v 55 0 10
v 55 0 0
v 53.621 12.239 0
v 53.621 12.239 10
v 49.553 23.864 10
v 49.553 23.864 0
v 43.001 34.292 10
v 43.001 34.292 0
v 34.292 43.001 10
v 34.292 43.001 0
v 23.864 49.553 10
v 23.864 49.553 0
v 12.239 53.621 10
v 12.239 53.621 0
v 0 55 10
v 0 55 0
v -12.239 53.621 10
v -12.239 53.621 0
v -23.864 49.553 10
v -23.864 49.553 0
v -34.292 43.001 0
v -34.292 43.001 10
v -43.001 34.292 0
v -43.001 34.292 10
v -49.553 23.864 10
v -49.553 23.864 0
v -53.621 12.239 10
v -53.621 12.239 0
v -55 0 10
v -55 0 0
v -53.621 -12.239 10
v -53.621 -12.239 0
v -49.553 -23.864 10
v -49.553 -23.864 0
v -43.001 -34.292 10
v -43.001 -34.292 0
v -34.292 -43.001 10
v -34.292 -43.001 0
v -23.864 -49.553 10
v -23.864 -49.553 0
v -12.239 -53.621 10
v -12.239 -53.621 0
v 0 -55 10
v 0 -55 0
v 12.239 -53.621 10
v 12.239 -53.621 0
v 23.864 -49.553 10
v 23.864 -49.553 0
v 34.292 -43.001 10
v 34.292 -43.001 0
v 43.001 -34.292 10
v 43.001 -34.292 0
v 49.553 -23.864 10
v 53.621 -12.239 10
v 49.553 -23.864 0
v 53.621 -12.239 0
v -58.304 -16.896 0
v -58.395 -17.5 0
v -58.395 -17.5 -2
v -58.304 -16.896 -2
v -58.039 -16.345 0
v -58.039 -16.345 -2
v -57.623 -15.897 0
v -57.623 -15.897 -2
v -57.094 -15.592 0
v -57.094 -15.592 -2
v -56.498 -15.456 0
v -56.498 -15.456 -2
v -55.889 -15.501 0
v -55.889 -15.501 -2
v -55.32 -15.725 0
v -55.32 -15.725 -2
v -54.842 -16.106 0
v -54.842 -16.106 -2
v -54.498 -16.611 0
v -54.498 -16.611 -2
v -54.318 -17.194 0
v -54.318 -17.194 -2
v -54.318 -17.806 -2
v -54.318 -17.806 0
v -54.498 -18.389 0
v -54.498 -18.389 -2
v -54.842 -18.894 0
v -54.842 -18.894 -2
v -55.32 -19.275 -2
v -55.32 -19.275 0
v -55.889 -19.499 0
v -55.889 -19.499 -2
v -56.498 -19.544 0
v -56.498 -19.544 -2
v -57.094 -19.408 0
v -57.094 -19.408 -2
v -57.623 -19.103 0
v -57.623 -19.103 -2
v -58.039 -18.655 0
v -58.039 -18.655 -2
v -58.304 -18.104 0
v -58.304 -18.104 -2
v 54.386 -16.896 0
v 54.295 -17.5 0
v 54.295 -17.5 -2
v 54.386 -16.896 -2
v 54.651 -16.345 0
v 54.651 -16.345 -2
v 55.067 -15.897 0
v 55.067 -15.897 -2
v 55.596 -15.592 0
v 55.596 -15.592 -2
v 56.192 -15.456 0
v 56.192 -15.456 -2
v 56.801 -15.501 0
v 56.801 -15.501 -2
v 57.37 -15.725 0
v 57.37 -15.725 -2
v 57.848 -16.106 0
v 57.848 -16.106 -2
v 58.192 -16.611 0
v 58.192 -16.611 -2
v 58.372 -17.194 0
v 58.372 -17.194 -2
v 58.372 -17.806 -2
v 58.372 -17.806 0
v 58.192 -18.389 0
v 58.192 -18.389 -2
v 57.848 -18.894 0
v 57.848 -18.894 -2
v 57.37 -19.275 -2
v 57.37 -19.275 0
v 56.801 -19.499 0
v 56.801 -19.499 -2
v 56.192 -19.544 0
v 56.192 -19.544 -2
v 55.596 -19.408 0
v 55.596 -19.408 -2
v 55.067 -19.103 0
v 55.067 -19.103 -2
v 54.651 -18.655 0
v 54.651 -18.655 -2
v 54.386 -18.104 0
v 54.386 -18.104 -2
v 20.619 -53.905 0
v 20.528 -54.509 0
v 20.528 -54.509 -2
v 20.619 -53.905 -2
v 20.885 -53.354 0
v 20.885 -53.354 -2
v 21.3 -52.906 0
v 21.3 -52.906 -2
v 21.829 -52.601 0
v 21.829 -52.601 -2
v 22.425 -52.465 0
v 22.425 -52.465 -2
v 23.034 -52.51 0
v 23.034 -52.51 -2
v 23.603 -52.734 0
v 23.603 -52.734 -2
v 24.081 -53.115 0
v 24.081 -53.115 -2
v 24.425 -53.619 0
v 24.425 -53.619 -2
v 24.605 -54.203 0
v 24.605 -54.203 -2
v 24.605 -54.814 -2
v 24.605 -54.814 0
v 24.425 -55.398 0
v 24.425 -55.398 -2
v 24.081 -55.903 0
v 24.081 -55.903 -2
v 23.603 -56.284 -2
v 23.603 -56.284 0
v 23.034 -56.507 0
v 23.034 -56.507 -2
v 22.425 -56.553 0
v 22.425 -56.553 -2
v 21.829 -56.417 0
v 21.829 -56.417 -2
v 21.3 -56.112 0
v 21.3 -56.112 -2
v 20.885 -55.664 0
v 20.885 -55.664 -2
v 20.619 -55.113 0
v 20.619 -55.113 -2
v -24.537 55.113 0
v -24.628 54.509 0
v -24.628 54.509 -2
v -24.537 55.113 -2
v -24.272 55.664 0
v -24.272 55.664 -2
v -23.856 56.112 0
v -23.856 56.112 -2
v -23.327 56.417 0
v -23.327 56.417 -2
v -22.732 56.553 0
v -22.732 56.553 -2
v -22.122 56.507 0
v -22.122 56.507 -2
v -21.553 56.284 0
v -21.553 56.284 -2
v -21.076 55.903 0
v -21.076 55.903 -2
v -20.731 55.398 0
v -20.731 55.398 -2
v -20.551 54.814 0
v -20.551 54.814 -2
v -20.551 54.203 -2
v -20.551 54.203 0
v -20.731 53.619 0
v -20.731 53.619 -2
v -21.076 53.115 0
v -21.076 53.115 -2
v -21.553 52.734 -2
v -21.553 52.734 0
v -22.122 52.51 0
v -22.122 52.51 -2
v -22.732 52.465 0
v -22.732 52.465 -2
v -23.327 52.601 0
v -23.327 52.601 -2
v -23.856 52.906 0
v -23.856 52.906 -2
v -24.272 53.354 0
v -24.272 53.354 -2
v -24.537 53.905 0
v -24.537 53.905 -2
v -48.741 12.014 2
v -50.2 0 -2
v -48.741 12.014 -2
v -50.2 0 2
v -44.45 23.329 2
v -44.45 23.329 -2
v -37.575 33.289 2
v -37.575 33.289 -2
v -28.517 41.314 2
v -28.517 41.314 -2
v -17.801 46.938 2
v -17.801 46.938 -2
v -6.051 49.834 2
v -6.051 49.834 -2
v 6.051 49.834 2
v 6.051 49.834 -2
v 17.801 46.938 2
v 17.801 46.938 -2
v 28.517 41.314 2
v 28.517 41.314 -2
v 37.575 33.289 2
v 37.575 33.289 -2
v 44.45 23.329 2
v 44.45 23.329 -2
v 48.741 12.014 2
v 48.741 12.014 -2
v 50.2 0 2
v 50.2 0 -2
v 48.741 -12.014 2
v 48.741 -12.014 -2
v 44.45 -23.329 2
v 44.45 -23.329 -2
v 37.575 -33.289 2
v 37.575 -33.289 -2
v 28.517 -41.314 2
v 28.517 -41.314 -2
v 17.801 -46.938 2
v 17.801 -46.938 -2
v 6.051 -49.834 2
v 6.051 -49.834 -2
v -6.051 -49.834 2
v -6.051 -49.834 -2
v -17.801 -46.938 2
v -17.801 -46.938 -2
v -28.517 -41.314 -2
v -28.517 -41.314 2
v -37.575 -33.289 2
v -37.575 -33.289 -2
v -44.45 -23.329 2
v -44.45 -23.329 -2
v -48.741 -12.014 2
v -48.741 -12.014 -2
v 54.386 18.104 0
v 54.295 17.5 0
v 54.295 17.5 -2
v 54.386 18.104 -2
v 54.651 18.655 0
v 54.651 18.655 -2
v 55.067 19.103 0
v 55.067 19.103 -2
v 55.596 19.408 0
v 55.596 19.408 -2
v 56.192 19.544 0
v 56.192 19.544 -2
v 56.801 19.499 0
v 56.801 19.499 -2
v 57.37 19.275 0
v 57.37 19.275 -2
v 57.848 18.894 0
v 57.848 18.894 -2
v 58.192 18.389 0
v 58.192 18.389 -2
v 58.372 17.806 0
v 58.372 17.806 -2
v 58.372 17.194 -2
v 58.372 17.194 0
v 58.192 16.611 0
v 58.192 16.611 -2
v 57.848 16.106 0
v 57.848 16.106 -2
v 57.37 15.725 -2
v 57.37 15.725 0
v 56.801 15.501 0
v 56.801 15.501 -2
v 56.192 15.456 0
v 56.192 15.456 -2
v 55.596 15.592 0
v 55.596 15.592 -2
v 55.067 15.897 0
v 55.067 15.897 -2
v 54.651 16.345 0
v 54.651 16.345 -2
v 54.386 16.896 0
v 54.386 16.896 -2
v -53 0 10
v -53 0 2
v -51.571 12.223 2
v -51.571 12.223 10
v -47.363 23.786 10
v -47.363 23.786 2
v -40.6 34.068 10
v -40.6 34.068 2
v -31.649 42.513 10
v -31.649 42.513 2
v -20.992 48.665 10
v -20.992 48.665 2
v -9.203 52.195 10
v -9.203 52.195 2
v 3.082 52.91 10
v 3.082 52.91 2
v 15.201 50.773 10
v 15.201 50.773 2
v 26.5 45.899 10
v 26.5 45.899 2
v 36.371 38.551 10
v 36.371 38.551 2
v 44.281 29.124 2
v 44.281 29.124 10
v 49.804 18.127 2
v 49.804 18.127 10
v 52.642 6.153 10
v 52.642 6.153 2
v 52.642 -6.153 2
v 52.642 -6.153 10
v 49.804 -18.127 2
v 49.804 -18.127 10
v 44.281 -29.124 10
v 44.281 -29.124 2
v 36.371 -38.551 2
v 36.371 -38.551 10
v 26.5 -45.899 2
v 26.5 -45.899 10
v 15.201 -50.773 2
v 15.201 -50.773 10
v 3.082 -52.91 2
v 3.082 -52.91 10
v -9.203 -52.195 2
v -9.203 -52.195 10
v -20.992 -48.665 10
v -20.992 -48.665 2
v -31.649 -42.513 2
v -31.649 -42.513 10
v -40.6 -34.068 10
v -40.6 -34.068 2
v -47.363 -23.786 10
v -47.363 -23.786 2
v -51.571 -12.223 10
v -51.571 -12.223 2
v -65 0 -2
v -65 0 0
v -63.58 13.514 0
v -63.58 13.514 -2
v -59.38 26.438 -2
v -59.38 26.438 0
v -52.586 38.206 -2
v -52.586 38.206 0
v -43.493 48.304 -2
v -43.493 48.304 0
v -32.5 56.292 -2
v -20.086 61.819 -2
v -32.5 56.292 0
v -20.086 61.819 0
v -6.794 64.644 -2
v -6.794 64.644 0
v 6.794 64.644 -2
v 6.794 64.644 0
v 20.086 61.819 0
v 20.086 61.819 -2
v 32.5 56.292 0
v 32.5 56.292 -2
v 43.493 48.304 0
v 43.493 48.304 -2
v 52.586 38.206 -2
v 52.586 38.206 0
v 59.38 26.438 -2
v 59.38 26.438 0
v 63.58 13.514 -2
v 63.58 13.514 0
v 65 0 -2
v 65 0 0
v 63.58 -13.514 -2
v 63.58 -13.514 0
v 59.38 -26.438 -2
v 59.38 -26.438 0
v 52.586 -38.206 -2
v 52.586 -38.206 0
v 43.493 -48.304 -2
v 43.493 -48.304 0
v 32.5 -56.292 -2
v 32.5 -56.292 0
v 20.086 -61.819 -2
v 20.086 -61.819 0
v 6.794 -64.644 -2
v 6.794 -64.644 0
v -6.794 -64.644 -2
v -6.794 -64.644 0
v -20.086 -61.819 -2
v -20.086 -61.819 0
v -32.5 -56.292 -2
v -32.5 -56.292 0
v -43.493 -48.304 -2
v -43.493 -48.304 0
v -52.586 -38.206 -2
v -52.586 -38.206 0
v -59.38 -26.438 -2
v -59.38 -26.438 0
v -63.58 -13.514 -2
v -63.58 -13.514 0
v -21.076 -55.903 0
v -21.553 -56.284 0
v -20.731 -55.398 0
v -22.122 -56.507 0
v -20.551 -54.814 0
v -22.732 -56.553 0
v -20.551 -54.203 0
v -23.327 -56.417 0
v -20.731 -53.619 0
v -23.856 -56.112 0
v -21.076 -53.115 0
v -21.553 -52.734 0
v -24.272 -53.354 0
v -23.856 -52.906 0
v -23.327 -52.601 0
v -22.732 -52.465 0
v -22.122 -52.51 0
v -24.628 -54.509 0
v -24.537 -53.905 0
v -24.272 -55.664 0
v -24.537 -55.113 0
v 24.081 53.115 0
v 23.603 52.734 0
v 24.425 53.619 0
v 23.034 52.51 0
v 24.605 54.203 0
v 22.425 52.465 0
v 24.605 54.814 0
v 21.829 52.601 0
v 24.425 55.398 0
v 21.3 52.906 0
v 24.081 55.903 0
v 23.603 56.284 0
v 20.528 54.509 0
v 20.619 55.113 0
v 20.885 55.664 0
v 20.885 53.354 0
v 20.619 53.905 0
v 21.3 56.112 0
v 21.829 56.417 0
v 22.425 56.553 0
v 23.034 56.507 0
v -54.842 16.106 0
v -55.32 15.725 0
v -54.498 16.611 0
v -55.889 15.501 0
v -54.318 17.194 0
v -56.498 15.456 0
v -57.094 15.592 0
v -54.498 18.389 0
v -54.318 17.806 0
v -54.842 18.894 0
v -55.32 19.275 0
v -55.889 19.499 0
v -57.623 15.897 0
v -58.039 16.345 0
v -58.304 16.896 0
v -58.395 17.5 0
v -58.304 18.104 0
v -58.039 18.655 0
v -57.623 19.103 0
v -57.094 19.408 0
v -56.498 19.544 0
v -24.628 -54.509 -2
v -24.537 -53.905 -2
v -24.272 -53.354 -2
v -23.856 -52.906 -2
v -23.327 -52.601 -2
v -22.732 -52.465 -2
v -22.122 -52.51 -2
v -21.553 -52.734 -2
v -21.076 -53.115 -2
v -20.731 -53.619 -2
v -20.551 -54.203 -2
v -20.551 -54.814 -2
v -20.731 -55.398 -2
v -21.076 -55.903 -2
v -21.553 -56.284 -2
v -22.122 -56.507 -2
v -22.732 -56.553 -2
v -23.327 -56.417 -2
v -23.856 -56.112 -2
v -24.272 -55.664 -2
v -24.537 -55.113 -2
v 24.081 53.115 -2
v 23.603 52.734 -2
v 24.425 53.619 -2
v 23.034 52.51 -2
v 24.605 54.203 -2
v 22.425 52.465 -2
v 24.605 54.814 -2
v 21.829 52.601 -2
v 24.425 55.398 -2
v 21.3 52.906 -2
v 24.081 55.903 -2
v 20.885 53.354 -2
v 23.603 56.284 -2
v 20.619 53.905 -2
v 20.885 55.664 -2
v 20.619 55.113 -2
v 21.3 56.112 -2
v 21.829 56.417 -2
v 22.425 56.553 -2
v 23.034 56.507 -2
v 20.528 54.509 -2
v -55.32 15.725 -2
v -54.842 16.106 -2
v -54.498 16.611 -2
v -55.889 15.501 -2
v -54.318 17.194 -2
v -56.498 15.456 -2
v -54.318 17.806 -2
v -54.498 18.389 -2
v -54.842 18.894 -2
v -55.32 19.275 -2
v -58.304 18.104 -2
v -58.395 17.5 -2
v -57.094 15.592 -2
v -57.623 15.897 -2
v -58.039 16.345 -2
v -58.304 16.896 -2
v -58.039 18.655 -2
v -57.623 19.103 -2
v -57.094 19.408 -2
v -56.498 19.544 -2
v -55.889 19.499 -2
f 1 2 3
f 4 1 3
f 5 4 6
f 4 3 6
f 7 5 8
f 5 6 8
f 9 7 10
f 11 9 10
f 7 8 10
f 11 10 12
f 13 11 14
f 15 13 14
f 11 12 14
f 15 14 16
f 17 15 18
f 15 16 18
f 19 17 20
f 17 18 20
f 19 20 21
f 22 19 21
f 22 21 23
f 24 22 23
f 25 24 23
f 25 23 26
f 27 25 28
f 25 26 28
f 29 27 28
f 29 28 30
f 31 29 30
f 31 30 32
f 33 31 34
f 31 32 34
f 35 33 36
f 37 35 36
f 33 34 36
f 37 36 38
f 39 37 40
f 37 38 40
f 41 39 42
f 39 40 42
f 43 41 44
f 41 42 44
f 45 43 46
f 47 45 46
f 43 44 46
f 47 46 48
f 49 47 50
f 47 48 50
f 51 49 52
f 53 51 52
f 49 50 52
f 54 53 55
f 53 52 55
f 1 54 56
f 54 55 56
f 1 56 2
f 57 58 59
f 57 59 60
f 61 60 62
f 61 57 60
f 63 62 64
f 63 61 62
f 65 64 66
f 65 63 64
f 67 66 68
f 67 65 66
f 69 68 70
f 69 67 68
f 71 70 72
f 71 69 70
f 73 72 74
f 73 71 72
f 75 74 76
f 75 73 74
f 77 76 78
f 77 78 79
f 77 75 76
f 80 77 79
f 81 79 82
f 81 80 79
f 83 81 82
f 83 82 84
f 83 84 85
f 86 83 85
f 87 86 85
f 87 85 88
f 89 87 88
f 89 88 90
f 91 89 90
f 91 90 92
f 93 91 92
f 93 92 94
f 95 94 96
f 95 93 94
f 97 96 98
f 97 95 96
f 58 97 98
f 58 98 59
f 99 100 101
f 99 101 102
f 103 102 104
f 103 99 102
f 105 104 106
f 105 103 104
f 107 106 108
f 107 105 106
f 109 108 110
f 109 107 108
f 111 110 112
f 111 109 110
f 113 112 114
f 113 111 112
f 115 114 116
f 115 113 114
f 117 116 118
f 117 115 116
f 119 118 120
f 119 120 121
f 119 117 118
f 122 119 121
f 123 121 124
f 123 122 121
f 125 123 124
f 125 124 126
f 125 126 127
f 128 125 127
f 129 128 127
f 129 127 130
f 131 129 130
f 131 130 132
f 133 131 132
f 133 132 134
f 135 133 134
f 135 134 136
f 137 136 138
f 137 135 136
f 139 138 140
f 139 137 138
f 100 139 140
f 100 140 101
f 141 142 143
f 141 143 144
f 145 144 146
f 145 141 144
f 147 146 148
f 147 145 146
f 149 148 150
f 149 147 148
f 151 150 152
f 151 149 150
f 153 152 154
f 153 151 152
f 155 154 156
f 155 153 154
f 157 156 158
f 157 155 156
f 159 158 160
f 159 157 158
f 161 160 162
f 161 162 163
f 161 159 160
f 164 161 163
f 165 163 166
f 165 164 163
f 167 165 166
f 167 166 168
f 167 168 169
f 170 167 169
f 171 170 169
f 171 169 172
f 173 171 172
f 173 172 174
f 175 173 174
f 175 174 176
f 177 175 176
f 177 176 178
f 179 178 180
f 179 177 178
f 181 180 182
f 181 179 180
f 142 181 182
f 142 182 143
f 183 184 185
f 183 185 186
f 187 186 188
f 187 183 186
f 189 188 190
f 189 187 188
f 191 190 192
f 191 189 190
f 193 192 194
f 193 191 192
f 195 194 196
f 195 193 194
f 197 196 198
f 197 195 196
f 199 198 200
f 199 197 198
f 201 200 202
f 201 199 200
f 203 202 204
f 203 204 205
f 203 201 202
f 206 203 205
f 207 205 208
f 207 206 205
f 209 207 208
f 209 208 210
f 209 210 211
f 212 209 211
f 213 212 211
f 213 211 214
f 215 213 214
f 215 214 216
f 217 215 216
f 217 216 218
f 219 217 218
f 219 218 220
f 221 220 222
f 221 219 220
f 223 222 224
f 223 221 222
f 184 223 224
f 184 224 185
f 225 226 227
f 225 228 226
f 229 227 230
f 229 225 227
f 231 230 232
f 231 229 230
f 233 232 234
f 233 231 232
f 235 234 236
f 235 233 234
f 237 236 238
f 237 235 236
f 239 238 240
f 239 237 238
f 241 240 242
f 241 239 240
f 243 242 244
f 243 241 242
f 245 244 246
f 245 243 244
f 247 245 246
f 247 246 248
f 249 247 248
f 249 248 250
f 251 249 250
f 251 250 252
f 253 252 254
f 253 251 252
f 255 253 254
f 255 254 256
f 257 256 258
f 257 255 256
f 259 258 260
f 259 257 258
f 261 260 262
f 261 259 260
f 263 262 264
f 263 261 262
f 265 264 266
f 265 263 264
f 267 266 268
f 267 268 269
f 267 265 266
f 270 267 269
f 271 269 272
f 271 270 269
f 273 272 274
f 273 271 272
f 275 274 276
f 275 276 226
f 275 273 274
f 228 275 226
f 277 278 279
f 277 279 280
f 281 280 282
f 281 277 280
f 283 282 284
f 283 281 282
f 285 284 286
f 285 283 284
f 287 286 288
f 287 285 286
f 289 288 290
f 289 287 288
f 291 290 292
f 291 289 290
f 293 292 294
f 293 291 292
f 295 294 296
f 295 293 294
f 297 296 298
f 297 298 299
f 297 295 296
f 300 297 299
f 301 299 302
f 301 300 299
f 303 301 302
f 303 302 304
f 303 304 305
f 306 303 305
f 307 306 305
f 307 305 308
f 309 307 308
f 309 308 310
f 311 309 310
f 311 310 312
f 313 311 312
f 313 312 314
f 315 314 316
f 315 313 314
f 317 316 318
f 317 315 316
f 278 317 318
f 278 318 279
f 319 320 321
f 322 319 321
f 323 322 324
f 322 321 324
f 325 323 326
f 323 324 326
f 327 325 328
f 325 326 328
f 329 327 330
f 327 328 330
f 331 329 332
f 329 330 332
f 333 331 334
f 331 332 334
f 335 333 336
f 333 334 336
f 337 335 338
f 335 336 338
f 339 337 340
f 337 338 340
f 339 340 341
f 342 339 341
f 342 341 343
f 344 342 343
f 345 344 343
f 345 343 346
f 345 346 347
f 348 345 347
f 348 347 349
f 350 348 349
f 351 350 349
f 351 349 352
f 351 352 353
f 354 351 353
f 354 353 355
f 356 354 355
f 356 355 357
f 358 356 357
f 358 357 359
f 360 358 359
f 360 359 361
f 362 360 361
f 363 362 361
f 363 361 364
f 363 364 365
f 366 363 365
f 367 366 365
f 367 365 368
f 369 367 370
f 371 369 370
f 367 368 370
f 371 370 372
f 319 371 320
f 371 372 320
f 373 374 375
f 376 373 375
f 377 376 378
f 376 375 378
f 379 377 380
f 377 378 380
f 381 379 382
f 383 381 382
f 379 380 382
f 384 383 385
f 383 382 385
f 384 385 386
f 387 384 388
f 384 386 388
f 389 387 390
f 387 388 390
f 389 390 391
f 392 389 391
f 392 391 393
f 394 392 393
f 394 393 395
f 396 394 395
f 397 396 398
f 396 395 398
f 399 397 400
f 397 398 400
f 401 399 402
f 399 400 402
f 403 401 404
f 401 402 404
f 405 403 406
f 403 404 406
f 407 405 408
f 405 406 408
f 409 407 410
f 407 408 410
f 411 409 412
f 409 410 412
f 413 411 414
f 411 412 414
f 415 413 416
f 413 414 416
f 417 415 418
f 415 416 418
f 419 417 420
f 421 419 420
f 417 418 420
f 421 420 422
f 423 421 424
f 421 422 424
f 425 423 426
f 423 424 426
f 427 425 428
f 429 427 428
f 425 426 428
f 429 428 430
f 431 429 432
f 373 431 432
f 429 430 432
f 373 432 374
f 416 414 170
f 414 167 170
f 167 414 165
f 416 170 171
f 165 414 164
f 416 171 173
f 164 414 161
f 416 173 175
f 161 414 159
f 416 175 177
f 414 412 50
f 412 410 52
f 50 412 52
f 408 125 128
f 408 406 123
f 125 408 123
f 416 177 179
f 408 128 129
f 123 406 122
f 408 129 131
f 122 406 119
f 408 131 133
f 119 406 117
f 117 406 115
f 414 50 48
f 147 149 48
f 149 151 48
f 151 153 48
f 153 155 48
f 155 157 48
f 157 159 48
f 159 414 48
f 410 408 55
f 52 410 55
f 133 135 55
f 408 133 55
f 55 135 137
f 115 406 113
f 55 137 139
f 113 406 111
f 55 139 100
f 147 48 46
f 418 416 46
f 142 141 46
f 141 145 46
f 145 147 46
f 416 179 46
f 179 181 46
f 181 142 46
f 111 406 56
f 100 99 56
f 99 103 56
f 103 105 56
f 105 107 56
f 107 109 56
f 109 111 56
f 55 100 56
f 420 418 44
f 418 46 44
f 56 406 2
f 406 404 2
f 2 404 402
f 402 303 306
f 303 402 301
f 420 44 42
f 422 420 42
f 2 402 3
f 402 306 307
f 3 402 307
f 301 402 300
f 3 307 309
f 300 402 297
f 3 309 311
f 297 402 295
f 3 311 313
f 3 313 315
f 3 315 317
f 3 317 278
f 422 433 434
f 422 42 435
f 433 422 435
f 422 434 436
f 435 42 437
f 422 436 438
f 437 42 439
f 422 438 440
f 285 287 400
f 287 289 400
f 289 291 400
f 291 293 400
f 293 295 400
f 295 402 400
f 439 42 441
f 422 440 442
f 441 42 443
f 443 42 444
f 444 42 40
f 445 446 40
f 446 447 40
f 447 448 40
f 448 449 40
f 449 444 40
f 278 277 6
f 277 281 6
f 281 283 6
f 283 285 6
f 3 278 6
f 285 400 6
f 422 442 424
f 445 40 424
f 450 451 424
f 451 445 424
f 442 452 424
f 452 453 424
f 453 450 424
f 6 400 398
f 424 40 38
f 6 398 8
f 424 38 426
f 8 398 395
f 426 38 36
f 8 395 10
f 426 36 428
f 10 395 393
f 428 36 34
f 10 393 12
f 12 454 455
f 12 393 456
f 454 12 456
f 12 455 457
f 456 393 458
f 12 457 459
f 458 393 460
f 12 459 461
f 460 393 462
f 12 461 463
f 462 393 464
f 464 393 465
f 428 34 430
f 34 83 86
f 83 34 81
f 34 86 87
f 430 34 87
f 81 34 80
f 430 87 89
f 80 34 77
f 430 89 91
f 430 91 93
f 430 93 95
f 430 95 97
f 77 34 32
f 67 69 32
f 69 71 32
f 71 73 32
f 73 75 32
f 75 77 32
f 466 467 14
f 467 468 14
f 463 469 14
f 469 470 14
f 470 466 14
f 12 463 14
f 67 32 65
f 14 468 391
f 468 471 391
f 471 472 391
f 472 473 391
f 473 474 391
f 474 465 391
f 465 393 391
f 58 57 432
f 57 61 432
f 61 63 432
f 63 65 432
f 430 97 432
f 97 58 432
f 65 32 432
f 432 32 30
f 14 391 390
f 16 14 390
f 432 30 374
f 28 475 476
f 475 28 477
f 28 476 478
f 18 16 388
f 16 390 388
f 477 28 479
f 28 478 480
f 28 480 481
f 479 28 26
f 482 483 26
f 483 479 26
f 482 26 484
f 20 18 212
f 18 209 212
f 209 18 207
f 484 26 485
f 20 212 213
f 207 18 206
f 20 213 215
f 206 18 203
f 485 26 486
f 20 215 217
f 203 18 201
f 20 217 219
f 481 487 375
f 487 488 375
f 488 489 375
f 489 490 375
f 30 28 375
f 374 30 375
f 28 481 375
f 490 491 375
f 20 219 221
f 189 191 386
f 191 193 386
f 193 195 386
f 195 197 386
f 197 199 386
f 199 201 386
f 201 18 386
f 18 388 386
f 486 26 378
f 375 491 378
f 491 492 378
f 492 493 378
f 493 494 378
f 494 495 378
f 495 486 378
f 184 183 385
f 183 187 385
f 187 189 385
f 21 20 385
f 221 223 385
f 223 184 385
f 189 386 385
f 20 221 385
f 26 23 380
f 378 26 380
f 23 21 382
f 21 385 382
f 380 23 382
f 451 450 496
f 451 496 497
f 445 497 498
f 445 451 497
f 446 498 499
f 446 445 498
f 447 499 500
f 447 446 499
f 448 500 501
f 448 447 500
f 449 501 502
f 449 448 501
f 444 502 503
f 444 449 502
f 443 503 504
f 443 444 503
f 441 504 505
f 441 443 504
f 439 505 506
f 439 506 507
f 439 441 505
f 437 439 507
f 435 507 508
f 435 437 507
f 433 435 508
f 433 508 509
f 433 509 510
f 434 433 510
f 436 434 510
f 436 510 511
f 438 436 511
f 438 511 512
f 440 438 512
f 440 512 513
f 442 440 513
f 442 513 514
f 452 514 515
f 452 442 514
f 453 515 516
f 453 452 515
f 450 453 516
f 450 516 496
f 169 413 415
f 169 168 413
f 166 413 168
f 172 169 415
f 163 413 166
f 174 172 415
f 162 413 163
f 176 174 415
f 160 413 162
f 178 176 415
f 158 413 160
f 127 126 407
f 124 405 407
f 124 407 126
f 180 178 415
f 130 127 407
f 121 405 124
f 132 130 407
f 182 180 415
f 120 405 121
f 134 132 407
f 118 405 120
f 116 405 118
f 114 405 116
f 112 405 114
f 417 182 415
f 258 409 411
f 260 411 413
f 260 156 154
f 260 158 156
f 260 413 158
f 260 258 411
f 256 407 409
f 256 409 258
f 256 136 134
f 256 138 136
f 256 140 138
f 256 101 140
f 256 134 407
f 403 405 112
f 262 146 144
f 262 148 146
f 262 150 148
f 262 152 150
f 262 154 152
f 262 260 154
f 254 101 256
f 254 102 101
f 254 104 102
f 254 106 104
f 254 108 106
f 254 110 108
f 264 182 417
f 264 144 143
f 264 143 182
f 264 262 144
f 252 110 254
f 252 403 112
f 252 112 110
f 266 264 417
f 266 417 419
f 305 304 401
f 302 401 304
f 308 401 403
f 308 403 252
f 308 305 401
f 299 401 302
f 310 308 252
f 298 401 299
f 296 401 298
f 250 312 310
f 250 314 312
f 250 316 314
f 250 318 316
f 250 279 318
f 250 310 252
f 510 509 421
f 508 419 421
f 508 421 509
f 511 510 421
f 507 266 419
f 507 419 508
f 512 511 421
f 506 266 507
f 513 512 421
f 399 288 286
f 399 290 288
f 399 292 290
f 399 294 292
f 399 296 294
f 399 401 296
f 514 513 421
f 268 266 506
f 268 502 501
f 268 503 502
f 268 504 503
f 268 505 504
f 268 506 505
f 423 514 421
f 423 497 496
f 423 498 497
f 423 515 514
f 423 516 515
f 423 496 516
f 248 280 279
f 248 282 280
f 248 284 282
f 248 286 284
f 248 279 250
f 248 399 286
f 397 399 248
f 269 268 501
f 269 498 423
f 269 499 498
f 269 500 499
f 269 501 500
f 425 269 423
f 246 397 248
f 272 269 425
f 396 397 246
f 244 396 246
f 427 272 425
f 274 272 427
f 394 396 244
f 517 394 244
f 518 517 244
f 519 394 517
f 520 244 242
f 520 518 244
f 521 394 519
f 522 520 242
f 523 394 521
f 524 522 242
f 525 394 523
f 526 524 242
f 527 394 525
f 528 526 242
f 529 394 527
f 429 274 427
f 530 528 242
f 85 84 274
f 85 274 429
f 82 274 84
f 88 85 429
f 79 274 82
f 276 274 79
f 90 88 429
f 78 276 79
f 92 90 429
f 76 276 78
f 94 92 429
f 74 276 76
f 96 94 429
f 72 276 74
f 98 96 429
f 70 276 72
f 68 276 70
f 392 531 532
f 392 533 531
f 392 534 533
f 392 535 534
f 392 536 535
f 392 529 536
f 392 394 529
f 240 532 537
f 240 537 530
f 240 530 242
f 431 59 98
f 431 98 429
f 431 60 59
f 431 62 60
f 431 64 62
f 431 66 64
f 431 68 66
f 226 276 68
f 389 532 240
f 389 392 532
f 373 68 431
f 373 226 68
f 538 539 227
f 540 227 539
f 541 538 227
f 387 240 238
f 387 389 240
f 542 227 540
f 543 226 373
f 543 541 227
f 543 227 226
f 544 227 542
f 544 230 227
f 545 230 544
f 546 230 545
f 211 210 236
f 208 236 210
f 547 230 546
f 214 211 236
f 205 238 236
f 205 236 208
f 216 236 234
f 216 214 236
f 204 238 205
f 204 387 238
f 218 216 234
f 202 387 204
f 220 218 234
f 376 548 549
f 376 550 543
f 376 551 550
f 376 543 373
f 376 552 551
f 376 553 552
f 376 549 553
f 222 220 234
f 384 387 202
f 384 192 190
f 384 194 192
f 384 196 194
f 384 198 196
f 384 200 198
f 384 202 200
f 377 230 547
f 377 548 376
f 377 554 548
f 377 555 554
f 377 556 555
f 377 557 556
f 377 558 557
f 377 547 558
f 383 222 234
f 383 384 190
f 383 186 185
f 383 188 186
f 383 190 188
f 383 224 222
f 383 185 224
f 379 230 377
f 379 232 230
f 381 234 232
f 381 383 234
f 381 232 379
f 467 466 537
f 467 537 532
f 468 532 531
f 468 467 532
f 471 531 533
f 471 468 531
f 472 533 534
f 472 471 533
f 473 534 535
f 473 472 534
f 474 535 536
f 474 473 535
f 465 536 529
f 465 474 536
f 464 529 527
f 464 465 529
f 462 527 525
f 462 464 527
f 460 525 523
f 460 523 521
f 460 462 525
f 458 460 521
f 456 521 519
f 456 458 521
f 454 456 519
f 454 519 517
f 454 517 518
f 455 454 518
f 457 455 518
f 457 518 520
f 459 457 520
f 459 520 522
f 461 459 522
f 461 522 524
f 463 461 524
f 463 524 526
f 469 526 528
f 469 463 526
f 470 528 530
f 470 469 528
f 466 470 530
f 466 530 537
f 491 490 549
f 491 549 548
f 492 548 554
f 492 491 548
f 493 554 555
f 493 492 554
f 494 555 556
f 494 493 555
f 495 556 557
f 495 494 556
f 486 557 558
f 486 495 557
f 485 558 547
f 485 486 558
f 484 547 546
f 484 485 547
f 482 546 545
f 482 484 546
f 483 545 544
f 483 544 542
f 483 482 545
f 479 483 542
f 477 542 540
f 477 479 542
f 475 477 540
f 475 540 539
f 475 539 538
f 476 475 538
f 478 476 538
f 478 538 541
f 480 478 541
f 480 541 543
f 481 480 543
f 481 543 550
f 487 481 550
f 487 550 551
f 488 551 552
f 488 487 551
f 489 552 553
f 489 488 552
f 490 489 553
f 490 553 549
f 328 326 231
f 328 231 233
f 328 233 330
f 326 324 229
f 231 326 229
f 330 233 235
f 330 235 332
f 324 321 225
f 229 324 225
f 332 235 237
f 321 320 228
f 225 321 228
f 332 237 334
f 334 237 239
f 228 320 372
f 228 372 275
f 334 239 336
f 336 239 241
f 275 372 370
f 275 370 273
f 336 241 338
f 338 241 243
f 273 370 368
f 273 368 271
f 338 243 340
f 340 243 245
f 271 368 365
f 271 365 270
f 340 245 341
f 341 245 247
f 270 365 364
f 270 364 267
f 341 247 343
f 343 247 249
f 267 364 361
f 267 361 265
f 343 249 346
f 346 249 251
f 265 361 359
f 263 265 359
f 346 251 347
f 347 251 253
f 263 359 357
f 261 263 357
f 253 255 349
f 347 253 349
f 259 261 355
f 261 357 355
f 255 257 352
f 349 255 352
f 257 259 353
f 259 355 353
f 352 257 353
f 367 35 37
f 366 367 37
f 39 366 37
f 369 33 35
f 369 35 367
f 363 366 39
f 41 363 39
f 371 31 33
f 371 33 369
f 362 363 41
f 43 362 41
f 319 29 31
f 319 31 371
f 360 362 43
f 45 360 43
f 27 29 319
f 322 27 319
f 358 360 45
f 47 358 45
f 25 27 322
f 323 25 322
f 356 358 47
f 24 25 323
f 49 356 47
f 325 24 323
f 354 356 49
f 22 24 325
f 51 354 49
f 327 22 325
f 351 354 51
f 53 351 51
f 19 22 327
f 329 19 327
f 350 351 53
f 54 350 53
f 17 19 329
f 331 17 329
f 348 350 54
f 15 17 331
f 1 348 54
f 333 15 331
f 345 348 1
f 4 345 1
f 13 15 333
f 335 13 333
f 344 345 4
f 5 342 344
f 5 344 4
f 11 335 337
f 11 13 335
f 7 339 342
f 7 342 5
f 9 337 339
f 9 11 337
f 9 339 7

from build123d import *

# Parameters (mm, degrees)
SKETCH_1_R          = 65
SKETCH_1_R_2        = 50.2
SKETCH_1_R_3        = 0.5
EXTRUDE_1_DEPTH     = 10
SKETCH_2_R          = 53
CUT_EXTRUDE_1_DEPTH = 8
CUT_EXTRUDE_START   = -8
SKETCH_9_R          = 65
SKETCH_9_R_2        = 55
CUT_EXTRUDE_2_DEPTH = 8
SKETCH_11_R         = 65
SKETCH_11_R_2       = 55
CUT_EXTRUDE_4_DEPTH = 15
SKETCH_12_R         = 53
CUT_EXTRUDE_6_DEPTH = 15
SKETCH_13_R         = 55
SKETCH_13_R_2       = 50.2
EXTRUDE_2_DEPTH     = 2
EXTRUDE_START       = -2
SKETCH_14_R         = 65
SKETCH_14_R_2       = 2.05
SKETCH_14_R_3       = 50.2
EXTRUDE_3_DEPTH     = 2


with BuildPart() as part:
    # 草图1 → 凸台-拉伸1 (new body)
    with BuildSketch(Plane.XY):
        Circle(SKETCH_1_R)
        Circle(SKETCH_1_R_2, mode=Mode.SUBTRACT)
        with Locations((0, 59)):
            Circle(SKETCH_1_R_3, mode=Mode.SUBTRACT)
        with Locations((29.5, 51.095498823)):
            Circle(SKETCH_1_R_3, mode=Mode.SUBTRACT)
        with Locations((51.095498823, 29.5)):
            Circle(SKETCH_1_R_3, mode=Mode.SUBTRACT)
        with Locations((59, 0)):
            Circle(SKETCH_1_R_3, mode=Mode.SUBTRACT)
        with Locations((51.095498823, -29.5)):
            Circle(SKETCH_1_R_3, mode=Mode.SUBTRACT)
        with Locations((29.5, -51.095498823)):
            Circle(SKETCH_1_R_3, mode=Mode.SUBTRACT)
        with Locations((0, -59)):
            Circle(SKETCH_1_R_3, mode=Mode.SUBTRACT)
        with Locations((-29.5, -51.095498823)):
            Circle(SKETCH_1_R_3, mode=Mode.SUBTRACT)
        with Locations((-51.095498823, -29.5)):
            Circle(SKETCH_1_R_3, mode=Mode.SUBTRACT)
        with Locations((-59, 0)):
            Circle(SKETCH_1_R_3, mode=Mode.SUBTRACT)
        with Locations((-51.095498823, 29.5)):
            Circle(SKETCH_1_R_3, mode=Mode.SUBTRACT)
        with Locations((-29.5, 51.095498823)):
            Circle(SKETCH_1_R_3, mode=Mode.SUBTRACT)
    extrude(amount=EXTRUDE_1_DEPTH)

    # 草图2 → 切除-拉伸1 (cut)
    with BuildSketch(Plane(origin=(0, 0, 0), x_dir=(-1, 0, 0), z_dir=(0, 0, -1))):
        Circle(SKETCH_2_R)
    extrude(amount=-CUT_EXTRUDE_1_DEPTH, mode=Mode.SUBTRACT)

    # 草图9 → 切除-拉伸2 (cut)
    with BuildSketch(Plane.XY.offset(10).offset(CUT_EXTRUDE_START)):
        Circle(SKETCH_9_R)
        Circle(SKETCH_9_R_2, mode=Mode.SUBTRACT)
    extrude(amount=CUT_EXTRUDE_2_DEPTH, mode=Mode.SUBTRACT)

    # 草图11 → 切除-拉伸4 (cut, symmetric)
    with BuildSketch(Plane.XY.offset(2)):
        Circle(SKETCH_11_R)
        Circle(SKETCH_11_R_2, mode=Mode.SUBTRACT)
    extrude(amount=CUT_EXTRUDE_4_DEPTH, both=True, mode=Mode.SUBTRACT)

    # 草图12 → 切除-拉伸6 (cut, symmetric)
    with BuildSketch(Plane(origin=(0, 0, 8), x_dir=(-1, 0, 0), z_dir=(0, 0, -1))):
        Circle(SKETCH_12_R)
    extrude(amount=CUT_EXTRUDE_6_DEPTH, both=True, mode=Mode.SUBTRACT)

    # 草图13 → 凸台-拉伸2 (add, symmetric)
    with BuildSketch(Plane(origin=(0, 0, 0), x_dir=(-1, 0, 0), z_dir=(0, 0, -1))):
        with Locations(Location((0, 0, 0), (0, 0, 180))):
            Circle(SKETCH_13_R)
        Circle(SKETCH_13_R_2, mode=Mode.SUBTRACT)
    extrude(amount=EXTRUDE_2_DEPTH, both=True)

    # 草图14 → 凸台-拉伸3 (add)
    with BuildSketch(Plane(origin=(0, 0, -2), x_dir=(-1, 0, 0), z_dir=(0, 0, -1)).offset(EXTRUDE_START)):
        Circle(SKETCH_14_R)
        with Locations((22.57832251, 54.508892418)):
            Circle(SKETCH_14_R_2, mode=Mode.SUBTRACT)
        with Locations((22.57832251, -54.508892418)):
            Circle(SKETCH_14_R_2, mode=Mode.SUBTRACT)
        with Locations((-22.57832251, -54.508892418)):
            Circle(SKETCH_14_R_2, mode=Mode.SUBTRACT)
        with Locations((-22.57832251, 54.508892418)):
            Circle(SKETCH_14_R_2, mode=Mode.SUBTRACT)
        Circle(SKETCH_14_R_3, mode=Mode.SUBTRACT)
        with Locations((-56.344919913, 17.5)):
            Circle(SKETCH_14_R_2, mode=Mode.SUBTRACT)
        with Locations((-56.344919913, -17.5)):
            Circle(SKETCH_14_R_2, mode=Mode.SUBTRACT)
        with Locations((56.344919913, 17.5)):
            Circle(SKETCH_14_R_2, mode=Mode.SUBTRACT)
        with Locations((56.344919913, -17.5)):
            Circle(SKETCH_14_R_2, mode=Mode.SUBTRACT)
    extrude(amount=EXTRUDE_3_DEPTH)


solid = part.part
